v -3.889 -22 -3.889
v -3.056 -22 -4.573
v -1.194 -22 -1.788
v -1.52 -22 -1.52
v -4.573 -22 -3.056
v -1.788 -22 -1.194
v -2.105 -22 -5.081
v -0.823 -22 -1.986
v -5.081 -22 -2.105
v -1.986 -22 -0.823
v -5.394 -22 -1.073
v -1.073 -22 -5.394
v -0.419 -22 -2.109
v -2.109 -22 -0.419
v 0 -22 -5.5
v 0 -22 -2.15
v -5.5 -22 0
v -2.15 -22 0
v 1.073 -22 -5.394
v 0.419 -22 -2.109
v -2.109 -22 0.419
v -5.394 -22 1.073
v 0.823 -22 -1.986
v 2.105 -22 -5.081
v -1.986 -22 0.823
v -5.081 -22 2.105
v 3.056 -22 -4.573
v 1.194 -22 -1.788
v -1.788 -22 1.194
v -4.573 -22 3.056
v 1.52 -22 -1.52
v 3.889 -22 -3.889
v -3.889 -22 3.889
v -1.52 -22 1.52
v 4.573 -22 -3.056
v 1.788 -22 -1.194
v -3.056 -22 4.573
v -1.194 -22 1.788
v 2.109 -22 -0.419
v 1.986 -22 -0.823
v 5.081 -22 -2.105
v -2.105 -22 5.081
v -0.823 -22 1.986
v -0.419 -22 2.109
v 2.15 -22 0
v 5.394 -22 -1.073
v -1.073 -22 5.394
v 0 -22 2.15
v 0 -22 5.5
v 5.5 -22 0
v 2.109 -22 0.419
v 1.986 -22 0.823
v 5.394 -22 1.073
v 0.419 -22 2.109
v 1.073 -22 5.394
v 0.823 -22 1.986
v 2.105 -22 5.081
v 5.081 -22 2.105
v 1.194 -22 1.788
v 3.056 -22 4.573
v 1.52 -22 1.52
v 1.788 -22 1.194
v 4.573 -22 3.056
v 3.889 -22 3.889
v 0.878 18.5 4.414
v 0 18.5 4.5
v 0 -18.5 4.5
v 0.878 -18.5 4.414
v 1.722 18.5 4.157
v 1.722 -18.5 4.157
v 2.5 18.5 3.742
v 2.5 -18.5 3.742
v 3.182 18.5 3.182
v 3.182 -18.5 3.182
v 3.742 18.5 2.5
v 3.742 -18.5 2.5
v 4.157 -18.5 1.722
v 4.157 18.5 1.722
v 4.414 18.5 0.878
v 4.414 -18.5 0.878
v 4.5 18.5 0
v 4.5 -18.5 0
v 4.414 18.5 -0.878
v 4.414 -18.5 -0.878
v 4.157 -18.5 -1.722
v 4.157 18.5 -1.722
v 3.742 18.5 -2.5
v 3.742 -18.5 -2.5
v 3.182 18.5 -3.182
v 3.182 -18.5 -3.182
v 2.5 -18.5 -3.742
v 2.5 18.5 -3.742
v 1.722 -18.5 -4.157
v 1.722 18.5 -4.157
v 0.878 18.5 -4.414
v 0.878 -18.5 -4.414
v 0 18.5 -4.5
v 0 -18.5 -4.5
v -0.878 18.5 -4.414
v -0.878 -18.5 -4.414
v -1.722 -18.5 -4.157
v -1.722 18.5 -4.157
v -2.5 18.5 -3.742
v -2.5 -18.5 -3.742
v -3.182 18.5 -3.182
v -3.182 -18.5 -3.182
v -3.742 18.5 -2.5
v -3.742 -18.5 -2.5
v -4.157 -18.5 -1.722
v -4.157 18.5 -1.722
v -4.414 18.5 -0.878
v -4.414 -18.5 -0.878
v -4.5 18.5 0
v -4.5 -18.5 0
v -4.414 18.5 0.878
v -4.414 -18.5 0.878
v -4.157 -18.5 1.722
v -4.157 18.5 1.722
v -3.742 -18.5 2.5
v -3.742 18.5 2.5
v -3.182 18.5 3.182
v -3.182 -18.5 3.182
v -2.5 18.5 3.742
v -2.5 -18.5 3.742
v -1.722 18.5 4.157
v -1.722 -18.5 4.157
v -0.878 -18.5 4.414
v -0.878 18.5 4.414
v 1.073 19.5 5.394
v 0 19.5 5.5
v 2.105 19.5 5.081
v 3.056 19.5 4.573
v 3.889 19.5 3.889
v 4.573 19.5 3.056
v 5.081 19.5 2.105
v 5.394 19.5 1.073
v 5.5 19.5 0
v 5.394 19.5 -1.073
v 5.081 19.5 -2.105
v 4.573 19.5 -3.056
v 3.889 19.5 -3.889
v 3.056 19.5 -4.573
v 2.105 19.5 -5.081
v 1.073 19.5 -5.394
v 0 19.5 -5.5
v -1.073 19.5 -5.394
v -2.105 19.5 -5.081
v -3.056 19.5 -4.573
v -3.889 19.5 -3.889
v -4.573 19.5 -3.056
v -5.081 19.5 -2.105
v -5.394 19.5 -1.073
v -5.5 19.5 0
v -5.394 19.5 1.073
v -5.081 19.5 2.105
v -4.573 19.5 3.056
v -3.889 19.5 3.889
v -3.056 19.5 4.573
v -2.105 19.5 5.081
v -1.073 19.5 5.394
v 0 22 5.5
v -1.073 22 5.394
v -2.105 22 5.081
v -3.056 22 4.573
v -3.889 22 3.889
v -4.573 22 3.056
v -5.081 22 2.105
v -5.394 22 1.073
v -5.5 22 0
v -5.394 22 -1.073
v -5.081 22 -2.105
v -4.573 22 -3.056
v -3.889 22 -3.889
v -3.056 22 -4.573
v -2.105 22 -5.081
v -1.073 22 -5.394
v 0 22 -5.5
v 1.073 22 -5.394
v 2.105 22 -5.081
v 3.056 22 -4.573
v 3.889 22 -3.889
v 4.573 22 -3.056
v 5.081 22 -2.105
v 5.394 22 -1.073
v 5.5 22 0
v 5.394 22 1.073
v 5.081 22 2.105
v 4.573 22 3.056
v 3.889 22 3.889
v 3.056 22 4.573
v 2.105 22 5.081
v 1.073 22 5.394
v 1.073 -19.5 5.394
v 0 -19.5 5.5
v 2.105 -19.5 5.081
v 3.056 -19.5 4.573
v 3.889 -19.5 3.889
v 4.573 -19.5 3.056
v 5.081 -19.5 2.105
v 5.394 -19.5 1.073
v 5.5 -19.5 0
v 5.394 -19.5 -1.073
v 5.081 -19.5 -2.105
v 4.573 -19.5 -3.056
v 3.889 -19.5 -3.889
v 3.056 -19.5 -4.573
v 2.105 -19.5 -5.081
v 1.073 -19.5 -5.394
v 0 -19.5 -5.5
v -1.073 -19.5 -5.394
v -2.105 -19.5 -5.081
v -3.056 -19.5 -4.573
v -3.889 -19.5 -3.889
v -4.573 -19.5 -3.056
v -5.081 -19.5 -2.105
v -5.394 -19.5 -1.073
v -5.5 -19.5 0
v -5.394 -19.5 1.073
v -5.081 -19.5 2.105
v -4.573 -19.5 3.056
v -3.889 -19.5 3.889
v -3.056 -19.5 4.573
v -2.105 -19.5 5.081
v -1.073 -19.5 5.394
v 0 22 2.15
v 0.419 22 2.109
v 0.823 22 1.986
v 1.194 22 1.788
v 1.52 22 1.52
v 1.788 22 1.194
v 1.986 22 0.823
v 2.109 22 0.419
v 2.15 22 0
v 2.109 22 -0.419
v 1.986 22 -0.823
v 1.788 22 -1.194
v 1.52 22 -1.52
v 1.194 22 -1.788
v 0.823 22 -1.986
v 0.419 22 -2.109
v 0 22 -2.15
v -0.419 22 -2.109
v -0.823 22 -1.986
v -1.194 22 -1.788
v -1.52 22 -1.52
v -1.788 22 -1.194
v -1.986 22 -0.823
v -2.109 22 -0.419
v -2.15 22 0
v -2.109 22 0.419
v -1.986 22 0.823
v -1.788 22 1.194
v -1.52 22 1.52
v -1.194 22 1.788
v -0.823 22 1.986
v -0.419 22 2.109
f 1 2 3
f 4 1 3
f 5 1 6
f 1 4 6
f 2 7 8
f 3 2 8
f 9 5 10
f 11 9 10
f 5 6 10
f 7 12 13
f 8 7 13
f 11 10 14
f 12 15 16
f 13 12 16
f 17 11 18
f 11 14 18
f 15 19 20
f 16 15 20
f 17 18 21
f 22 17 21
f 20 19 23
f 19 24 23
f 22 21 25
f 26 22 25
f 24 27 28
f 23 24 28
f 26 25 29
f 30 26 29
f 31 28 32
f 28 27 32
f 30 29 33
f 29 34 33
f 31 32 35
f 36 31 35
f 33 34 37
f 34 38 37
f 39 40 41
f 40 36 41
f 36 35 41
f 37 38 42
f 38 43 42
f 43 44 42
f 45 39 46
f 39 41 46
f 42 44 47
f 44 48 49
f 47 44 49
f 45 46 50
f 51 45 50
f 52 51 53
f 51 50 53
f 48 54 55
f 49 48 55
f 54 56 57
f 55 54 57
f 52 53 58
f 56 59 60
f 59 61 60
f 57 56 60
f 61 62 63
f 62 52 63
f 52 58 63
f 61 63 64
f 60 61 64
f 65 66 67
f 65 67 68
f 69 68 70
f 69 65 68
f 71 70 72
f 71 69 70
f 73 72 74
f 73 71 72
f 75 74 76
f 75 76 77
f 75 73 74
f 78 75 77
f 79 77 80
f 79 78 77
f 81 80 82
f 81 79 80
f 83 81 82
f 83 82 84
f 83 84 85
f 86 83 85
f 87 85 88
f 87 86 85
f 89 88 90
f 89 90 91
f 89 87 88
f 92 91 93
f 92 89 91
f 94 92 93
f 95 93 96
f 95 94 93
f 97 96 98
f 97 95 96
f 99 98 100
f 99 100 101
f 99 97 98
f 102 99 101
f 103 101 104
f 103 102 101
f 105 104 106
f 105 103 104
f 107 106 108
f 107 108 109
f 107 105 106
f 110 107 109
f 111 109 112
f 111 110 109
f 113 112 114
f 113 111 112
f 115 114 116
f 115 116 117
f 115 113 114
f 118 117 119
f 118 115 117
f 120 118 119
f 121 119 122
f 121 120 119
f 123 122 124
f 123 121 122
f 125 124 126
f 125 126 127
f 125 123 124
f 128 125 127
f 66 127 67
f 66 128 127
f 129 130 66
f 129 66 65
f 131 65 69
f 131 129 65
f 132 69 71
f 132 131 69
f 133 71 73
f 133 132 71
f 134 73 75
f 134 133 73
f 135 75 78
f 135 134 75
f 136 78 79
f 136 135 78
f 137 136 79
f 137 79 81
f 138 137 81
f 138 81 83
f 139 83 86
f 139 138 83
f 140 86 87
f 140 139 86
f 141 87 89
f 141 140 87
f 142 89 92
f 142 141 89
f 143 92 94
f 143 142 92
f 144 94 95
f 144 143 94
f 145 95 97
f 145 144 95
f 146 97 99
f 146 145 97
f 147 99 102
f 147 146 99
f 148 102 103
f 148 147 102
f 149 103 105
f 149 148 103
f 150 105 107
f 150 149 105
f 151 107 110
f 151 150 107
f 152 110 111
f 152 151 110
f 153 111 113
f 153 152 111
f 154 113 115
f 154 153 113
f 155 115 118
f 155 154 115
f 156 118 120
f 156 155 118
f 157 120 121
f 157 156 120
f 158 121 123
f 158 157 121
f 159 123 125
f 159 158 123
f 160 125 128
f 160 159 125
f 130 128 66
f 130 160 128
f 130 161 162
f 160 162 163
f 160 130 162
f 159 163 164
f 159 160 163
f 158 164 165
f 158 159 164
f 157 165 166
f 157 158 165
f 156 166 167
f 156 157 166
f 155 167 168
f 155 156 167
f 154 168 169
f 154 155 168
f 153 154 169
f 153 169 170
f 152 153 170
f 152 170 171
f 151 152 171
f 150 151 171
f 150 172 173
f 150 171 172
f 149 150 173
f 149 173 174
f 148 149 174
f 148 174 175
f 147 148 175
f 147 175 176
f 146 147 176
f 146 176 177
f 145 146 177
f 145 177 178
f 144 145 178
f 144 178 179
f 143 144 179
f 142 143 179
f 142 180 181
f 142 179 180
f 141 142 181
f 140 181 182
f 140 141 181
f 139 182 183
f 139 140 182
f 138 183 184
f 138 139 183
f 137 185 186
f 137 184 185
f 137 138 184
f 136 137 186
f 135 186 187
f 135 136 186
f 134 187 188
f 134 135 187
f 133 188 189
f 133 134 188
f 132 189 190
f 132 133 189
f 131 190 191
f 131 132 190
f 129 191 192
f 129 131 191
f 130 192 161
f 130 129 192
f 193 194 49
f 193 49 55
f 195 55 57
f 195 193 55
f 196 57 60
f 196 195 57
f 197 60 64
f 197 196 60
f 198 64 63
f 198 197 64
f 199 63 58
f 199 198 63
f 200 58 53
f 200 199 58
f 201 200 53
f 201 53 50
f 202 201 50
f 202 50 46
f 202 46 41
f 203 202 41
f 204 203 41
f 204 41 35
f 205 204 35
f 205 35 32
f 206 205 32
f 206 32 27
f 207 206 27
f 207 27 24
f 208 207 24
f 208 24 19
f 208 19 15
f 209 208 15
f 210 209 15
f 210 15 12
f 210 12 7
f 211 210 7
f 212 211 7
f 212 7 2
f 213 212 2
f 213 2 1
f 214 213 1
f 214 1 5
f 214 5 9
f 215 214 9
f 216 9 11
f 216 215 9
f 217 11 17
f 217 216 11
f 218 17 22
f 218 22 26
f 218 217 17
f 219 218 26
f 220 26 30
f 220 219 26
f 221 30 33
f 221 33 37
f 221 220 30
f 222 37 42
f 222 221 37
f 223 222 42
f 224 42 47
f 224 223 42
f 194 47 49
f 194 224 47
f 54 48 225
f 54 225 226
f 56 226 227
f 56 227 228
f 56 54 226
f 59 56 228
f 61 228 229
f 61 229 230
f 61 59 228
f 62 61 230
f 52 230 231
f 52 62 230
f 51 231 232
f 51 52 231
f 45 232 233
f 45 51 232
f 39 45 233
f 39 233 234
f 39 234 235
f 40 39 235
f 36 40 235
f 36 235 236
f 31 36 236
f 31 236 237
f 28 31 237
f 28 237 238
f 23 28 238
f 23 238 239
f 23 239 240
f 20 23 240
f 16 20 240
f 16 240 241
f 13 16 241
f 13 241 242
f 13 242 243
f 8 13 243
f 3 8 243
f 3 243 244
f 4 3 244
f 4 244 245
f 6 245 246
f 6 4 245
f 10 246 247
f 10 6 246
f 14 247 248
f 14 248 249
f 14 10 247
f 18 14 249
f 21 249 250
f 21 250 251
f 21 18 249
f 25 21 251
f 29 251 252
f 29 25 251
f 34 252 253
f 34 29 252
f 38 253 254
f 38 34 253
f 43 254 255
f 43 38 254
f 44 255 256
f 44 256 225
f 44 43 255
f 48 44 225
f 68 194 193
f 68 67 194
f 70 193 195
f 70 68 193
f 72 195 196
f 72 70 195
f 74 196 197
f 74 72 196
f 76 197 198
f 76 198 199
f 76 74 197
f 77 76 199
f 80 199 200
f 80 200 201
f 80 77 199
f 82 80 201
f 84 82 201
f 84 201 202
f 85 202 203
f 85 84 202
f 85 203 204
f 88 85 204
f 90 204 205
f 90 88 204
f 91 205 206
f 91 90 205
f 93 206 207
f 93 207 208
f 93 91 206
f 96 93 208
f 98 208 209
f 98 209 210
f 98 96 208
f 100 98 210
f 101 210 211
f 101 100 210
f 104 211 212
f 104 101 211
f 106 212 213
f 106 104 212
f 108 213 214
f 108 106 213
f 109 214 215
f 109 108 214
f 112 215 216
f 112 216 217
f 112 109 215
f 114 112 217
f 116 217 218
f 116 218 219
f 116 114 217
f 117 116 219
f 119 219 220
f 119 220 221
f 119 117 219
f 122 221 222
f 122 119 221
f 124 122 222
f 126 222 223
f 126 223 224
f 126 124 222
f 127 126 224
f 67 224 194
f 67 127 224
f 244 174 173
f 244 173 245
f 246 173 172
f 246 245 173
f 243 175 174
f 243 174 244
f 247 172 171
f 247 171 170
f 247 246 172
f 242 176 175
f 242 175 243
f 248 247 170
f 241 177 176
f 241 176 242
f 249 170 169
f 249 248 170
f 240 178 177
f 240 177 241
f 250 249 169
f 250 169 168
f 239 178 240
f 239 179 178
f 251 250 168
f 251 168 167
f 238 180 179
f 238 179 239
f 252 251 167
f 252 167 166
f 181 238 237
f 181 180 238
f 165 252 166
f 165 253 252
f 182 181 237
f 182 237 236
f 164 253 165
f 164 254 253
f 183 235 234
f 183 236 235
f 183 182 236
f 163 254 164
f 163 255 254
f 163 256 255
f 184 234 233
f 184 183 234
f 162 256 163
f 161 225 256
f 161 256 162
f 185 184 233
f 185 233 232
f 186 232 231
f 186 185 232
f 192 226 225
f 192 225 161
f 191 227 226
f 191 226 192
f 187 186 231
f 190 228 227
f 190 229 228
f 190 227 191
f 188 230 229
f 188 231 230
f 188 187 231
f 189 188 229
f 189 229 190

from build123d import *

# Parameters (mm, degrees)
SKETCH_2_R      = 4.5
SKETCH_2_R_2    = 2.15
EXTRUDE_1_DEPTH = 22
EXTRUDE_START   = -2
SKETCH_3_R      = 5.5
SKETCH_3_R_2    = 2.15
EXTRUDE_2_DEPTH = 2
CHAMFER_1_SIZE  = 1.5


with BuildPart() as part:
    # 草图2 → 凸台-拉伸1 (new, symmetric)
    with BuildSketch(Plane(origin=(0, 0, 0), x_dir=(1, 0, 0), z_dir=(0, 1, 0))):
        with Locations(Location((0, 0, 0), (0, 0, 270))):
            Circle(SKETCH_2_R)
        with Locations(Location((0, 0, 0), (0, 0, 270))):
            Circle(SKETCH_2_R_2, mode=Mode.SUBTRACT)
    extrude(amount=EXTRUDE_1_DEPTH, both=True)

    # 草图3 → 凸台-拉伸2 (add)
    with BuildSketch(Plane(origin=(0, 22, 0), x_dir=(1, 0, 0), z_dir=(0, 1, 0)).offset(EXTRUDE_START)):
        with Locations(Location((0, 0, 0), (0, 0, 270))):
            Circle(SKETCH_3_R)
        with Locations(Location((0, 0, 0), (0, 0, 270))):
            Circle(SKETCH_3_R_2, mode=Mode.SUBTRACT)
    extrude_2 = extrude(amount=EXTRUDE_2_DEPTH)

    # 镜向1: 凸台-拉伸2 across plane
    add(extrude_2.mirror(Plane.ZX))

    # 倒角1
    # the kernel refuses this chamfer: 1.5 mm, written as the material it adds along each edge
    with BuildSketch(Plane(origin=(0, -20, 0), x_dir=(0, 0, 1), z_dir=(-1, 0, 0))) as chamfer_1_piece_1_section:
        Polygon((4.5 + CHAMFER_1_SIZE, 0), (4.5, CHAMFER_1_SIZE), (4.5, 0), align=None)
    chamfer_1_piece_1 = revolve(axis=Axis((0, -20, 0), (0, 1, 0)), mode=Mode.PRIVATE)
    chamfer_1_piece_1 = chamfer_1_piece_1 & Plane(origin=(0, -19.001553526, 0), x_dir=(0, 0, 1), z_dir=(0, 1, 0)) * Cylinder(5.5, 24, mode=Mode.PRIVATE)
    add(chamfer_1_piece_1)
    with BuildSketch(Plane(origin=(0, 20, 0), x_dir=(0, 0, 1), z_dir=(-1, 0, 0))) as chamfer_1_piece_2_section:
        Polygon((4.5, -CHAMFER_1_SIZE), (4.5 + CHAMFER_1_SIZE, 0), (4.5, 0), align=None)
    chamfer_1_piece_2 = revolve(axis=Axis((0, 20, 0), (0, 1, 0)), mode=Mode.PRIVATE)
    chamfer_1_piece_2 = chamfer_1_piece_2 & Plane(origin=(0, 19.001553526, 0), x_dir=(0, 0, 1), z_dir=(0, -1, 0)) * Cylinder(5.5, 24, mode=Mode.PRIVATE)
    add(chamfer_1_piece_2)


solid = part.part
